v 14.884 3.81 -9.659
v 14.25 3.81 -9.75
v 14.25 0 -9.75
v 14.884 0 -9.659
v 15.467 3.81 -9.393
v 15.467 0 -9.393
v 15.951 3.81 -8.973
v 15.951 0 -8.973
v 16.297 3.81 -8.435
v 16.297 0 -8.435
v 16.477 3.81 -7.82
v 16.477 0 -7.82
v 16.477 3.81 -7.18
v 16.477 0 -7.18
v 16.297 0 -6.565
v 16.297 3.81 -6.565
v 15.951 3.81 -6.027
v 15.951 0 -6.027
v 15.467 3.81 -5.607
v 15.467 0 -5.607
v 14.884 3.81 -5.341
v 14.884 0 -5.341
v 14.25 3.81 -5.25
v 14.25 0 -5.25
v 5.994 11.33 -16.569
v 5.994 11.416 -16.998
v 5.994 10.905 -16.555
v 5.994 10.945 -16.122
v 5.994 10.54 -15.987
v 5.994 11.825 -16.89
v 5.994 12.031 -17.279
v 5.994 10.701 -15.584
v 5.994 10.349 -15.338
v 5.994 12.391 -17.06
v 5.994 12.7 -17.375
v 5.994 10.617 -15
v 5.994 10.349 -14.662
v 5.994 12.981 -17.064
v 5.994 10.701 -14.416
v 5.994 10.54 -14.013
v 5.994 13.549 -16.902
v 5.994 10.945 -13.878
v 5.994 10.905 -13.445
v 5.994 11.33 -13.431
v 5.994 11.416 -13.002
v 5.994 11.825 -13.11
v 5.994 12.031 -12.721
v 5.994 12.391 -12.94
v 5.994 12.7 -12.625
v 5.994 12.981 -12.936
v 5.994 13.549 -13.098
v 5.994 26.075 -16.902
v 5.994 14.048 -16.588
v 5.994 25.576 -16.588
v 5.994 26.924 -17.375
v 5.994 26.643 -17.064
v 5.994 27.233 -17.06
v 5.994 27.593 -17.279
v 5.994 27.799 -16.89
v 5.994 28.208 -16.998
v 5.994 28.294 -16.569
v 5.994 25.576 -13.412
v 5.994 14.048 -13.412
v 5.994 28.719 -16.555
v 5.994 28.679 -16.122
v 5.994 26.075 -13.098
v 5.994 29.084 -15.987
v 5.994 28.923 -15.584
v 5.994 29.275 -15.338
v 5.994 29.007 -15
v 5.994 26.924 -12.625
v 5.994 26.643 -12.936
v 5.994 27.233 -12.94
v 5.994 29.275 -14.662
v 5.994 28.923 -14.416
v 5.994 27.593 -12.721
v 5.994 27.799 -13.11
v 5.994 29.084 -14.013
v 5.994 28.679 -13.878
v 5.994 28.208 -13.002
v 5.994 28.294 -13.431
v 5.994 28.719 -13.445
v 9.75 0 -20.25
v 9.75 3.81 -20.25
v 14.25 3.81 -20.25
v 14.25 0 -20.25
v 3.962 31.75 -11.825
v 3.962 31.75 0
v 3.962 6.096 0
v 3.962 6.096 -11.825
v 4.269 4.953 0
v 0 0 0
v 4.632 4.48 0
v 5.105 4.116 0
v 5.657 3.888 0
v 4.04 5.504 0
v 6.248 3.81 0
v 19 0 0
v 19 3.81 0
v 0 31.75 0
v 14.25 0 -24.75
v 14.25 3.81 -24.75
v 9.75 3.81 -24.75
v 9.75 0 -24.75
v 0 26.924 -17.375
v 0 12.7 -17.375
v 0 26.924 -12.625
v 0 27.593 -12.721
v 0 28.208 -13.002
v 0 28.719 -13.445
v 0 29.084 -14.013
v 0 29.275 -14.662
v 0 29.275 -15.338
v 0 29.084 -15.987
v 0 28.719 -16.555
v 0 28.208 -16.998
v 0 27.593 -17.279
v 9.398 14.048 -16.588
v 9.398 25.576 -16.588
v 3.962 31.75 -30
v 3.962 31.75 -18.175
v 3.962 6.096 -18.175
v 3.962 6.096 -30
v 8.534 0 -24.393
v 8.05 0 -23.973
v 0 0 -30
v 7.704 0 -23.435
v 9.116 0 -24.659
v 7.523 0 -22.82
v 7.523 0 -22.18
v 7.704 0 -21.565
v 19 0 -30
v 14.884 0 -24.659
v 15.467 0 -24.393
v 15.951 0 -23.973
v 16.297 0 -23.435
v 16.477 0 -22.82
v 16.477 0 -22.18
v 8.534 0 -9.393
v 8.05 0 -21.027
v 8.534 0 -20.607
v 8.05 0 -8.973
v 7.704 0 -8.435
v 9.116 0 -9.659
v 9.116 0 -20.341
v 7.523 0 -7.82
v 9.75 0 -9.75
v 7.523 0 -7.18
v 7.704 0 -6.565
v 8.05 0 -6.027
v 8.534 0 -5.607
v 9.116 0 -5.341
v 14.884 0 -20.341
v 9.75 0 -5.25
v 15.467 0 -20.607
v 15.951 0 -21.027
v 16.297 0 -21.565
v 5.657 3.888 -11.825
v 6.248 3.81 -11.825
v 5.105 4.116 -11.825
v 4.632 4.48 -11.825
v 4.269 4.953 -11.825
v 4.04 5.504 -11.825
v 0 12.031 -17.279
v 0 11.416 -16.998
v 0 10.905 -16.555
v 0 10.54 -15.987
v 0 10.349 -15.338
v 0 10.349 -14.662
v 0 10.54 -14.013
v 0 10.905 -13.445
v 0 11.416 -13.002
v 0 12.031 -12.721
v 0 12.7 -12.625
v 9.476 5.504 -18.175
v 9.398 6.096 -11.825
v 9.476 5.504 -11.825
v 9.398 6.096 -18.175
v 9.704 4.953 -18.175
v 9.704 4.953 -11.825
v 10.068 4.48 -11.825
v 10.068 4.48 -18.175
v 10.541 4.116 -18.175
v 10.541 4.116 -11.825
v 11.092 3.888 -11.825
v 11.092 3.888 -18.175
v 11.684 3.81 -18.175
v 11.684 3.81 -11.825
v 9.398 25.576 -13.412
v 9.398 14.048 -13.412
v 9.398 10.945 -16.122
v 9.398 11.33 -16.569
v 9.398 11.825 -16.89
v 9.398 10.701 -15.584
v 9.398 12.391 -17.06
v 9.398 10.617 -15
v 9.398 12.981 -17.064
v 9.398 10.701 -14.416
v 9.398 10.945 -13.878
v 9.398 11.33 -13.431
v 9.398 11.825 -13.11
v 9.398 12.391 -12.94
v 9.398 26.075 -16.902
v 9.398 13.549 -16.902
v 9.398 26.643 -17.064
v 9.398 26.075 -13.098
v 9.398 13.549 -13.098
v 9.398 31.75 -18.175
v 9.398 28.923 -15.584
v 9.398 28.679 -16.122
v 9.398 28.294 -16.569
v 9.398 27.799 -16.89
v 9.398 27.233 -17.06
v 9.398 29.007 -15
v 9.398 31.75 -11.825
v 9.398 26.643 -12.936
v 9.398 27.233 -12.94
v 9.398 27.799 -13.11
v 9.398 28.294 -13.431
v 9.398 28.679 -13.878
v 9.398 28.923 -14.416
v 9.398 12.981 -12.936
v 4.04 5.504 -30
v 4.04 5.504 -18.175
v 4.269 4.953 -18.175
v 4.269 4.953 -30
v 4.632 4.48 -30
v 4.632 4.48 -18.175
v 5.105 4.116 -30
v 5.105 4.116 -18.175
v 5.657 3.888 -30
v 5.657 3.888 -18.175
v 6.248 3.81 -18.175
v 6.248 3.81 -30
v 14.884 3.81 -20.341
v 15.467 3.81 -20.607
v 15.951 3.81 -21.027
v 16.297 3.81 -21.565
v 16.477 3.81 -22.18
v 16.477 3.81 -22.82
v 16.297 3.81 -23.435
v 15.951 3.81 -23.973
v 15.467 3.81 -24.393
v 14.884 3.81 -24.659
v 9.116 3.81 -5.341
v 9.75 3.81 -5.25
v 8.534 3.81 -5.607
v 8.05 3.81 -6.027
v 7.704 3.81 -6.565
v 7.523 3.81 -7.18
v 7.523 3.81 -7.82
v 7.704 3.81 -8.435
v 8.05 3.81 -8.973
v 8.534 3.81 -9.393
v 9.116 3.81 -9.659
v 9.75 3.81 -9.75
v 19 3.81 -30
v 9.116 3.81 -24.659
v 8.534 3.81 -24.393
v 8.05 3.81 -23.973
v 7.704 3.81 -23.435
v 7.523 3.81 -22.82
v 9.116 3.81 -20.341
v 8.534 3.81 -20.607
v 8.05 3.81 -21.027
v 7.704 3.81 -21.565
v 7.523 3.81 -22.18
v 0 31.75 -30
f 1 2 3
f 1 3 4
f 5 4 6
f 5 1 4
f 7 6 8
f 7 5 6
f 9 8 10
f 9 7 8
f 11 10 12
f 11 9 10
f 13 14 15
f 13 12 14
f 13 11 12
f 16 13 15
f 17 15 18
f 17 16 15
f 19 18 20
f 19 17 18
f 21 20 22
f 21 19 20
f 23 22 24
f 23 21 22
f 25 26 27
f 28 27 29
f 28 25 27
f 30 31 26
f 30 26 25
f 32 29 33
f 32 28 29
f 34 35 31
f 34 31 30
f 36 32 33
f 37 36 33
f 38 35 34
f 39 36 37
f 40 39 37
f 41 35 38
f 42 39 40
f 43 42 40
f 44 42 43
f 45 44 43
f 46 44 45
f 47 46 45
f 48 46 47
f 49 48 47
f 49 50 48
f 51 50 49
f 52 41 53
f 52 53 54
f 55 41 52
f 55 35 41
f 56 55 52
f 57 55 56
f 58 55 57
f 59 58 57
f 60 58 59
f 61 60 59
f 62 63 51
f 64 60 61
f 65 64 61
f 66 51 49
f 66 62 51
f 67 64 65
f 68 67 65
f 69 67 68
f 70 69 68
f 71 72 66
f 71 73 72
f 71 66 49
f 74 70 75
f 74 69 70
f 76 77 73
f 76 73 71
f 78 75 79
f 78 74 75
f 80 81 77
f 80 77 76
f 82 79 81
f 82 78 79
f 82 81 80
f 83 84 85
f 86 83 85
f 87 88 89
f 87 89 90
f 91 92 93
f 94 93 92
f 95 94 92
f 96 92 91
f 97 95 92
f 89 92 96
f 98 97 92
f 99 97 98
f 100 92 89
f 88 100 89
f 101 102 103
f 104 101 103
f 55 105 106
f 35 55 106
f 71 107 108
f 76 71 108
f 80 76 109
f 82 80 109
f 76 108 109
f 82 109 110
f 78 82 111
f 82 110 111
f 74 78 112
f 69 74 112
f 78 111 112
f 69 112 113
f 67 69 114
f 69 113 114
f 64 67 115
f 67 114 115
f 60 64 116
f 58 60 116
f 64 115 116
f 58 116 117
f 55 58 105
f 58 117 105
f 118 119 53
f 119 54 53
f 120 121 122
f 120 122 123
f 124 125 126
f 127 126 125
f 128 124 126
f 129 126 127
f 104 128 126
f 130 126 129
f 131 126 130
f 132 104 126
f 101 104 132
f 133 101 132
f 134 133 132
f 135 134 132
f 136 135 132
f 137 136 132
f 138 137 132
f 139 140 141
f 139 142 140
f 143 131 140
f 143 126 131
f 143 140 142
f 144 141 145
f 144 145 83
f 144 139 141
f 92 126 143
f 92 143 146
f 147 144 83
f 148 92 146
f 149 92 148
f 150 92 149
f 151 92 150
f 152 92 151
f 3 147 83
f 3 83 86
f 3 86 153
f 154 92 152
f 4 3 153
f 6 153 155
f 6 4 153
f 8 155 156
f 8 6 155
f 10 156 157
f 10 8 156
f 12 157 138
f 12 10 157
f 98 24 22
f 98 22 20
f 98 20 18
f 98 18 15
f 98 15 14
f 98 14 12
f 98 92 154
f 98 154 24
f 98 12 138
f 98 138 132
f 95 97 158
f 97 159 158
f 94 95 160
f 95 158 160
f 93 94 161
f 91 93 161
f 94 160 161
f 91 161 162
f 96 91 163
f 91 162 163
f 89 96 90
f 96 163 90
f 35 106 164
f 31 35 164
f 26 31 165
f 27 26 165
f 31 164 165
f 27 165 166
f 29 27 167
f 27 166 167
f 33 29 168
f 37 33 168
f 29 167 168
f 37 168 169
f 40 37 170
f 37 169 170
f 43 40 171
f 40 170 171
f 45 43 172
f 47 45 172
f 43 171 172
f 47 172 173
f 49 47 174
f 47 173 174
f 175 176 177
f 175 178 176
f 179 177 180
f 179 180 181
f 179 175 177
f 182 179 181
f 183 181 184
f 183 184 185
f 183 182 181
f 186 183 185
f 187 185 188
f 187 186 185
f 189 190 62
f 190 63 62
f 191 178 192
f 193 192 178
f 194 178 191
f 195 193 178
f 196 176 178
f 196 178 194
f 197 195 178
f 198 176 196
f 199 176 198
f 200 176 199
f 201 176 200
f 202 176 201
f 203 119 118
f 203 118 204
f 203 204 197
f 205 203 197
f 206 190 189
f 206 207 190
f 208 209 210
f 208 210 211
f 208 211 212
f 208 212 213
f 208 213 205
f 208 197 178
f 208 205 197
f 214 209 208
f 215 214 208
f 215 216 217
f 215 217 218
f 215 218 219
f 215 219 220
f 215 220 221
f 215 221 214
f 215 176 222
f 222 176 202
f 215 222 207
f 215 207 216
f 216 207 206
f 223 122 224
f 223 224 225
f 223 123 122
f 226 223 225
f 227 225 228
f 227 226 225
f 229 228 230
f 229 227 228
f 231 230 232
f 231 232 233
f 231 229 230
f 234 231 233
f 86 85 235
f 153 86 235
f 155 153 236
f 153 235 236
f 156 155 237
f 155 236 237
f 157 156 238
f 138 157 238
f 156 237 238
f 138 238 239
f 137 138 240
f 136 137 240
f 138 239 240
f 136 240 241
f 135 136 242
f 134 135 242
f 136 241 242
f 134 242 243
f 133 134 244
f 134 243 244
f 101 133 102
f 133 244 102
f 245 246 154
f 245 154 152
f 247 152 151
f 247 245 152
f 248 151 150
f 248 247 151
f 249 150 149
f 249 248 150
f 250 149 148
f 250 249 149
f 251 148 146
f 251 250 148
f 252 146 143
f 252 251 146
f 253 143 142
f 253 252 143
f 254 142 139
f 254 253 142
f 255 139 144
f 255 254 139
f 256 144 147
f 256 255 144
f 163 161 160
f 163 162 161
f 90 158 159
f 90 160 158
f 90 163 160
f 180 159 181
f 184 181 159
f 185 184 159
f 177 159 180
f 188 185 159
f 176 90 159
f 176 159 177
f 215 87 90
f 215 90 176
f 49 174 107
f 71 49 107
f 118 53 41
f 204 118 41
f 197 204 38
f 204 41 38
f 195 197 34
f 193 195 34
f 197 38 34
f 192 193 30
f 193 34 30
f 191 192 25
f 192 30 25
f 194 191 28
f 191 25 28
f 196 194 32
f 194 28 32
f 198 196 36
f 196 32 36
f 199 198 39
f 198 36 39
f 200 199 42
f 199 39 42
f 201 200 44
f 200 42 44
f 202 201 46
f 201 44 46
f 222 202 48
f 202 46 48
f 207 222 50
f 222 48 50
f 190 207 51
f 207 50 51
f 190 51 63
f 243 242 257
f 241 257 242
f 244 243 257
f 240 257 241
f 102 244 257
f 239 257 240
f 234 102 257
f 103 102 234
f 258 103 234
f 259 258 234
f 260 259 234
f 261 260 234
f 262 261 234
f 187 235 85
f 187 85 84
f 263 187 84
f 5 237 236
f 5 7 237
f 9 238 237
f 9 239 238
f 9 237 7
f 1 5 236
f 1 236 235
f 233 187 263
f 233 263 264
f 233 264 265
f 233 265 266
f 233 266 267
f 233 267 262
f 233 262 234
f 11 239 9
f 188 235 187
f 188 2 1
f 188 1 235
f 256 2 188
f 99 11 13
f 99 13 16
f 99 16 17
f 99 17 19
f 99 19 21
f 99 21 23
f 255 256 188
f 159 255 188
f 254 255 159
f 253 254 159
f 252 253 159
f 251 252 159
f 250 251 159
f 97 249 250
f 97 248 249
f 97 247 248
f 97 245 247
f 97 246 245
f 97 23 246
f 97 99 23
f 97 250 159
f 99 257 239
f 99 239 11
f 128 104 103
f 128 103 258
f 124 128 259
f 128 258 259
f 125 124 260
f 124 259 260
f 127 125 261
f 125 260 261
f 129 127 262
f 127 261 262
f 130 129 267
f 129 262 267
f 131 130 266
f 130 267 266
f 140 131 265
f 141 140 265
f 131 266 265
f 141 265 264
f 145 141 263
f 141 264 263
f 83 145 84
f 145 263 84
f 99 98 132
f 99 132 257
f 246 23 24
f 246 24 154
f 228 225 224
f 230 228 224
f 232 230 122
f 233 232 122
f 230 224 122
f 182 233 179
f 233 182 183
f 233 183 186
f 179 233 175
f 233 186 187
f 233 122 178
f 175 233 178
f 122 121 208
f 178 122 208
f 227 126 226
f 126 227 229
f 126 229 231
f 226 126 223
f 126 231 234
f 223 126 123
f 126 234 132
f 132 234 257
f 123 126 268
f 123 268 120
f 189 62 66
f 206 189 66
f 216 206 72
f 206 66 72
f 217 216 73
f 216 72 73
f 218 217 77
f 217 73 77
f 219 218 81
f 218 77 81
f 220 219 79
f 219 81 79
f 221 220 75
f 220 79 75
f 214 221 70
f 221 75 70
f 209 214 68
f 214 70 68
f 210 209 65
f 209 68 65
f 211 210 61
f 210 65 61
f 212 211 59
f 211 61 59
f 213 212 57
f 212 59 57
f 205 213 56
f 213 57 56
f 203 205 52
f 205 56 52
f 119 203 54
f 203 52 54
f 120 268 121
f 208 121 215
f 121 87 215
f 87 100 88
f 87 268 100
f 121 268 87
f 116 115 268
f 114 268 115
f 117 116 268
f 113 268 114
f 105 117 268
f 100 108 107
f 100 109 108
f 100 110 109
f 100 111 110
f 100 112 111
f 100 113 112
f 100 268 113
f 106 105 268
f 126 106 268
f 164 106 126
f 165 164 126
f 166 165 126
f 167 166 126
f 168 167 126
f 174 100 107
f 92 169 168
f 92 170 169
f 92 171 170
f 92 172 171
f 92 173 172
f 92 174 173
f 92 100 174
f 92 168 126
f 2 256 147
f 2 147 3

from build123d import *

# Parameters (mm, degrees)
EXTRUDE_THIN1_DEPTH     = 30
EXTRUDE5_DEPTH          = 4.81
SKETCH10_W              = 5.588
SKETCH10_H              = 27.94
BOSS_EXTRUDE1_DEPTH     = 30
CUT_EXTRUDE1_DEPTH      = 16.19
CUT_EXTRUDE1_DEPTH_BACK = 4.81
F_8_32_TAPPED_HOLE1_D   = 4.1656
SKETCH14_W              = 5.4356
SKETCH14_H              = 11.825
CUT_EXTRUDE2_DEPTH      = 27.94
FILLET1_R               = 2.286
FILLET2_R               = 2.286
CUT_EXTRUDE3_DEPTH      = 5.9944


with BuildPart() as part:
    # Sketch1 → Extrude-Thin1 (new body)
    with BuildSketch(Plane.XY):
        Polygon((0, 31.75), (0, 0), (19, 0), (19, 3.81), (3.81, 3.81), (3.81, 31.75), align=None)
    extrude(amount=-EXTRUDE_THIN1_DEPTH)

    # Sketch6 → Extrude5 (cut, through all)
    with BuildSketch(Plane(origin=(0, 3.81, 0), x_dir=(1, 0, 0), z_dir=(0, 1, 0))):
        with BuildLine():
            Line((14.2502, 24.75), (9.7502, 24.75))
            ThreePointArc((9.7502, 24.75), (7.5002, 22.5), (9.7502, 20.25))
            Line((9.7502, 20.25), (14.2502, 20.25))
            ThreePointArc((14.2502, 20.25), (16.5002, 22.5), (14.2502, 24.75))
        make_face()
        with BuildLine():
            Line((9.7502, 9.75), (14.2502, 9.75))
            ThreePointArc((14.2502, 9.75), (16.5002, 7.5), (14.2502, 5.25))
            Line((14.2502, 5.25), (9.7502, 5.25))
            ThreePointArc((9.7502, 5.25), (7.5002, 7.5), (9.7502, 9.75))
        make_face()
    extrude(amount=-EXTRUDE5_DEPTH, mode=Mode.SUBTRACT)

    # Sketch10 → Boss-Extrude1 (add)
    with BuildSketch(Plane.XY):
        with Locations((6.604, 17.78)):
            Rectangle(SKETCH10_W, SKETCH10_H)
    extrude(amount=-BOSS_EXTRUDE1_DEPTH)

    # Sketch4 → Cut-Extrude1 (cut, two sides)
    with BuildSketch(Plane(origin=(3.81, 0, 0), x_dir=(0, 0, -1), z_dir=(1, 0, 0))) as cut_extrude1_sk:
        with BuildLine():
            Line((13.4125, 12.7), (13.4125, 26.924))
            ThreePointArc((13.4125, 26.924), (15, 28.5115), (16.5875, 26.924))
            Line((16.5875, 26.924), (16.5875, 12.7))
            ThreePointArc((16.5875, 12.7), (15, 11.1125), (13.4125, 12.7))
        make_face()
    extrude(amount=CUT_EXTRUDE1_DEPTH, mode=Mode.SUBTRACT)
    extrude(cut_extrude1_sk.sketch, amount=-CUT_EXTRUDE1_DEPTH_BACK, mode=Mode.SUBTRACT)

    # #8-32 Tapped Hole1 (through all)
    with Locations(Plane(origin=(9.398, 0, 0), x_dir=(0, 0, -1), z_dir=(1, 0, 0))):
        with Locations((15, 12.7), (15, 26.924)):
            Hole(F_8_32_TAPPED_HOLE1_D / 2)

    # Sketch14 → Cut-Extrude2 (cut)
    with BuildSketch(Plane(origin=(0, 31.75, 0), x_dir=(1, 0, 0), z_dir=(0, 1, 0))):
        with Locations((6.6802, 24.0875)):
            Rectangle(SKETCH14_W, SKETCH14_H)
        with Locations((6.6802, 5.9125)):
            Rectangle(SKETCH14_W, SKETCH14_H)
    extrude(amount=-CUT_EXTRUDE2_DEPTH, mode=Mode.SUBTRACT)

    # Fillet1
    fillet1_edges = [part.edges().sort_by_distance(p)[0] for p in [
        (9.398, 3.81, -15),
    ]]
    fillet(fillet1_edges, radius=FILLET1_R)

    # Fillet2
    fillet2_edges = [part.edges().sort_by_distance(p)[0] for p in [
        (3.9624, 3.81, -24.0875),
        (3.9624, 3.81, -5.9125),
    ]]
    fillet(fillet2_edges, radius=FILLET2_R)

    # Sketch11 → Cut-Extrude3 (cut)
    with BuildSketch(Plane(origin=(0, 0, 5.175), x_dir=(0, 0, -1), z_dir=(1, 0, 0))):
        with BuildLine():
            Line((17.8001, 12.7), (17.8001, 26.924))
            ThreePointArc((17.8001, 26.924), (20.175, 29.2989), (22.5499, 26.924))
            Line((22.5499, 26.924), (22.5499, 12.7))
            ThreePointArc((22.5499, 12.7), (20.175, 10.3251), (17.8001, 12.7))
        make_face()
    extrude(amount=CUT_EXTRUDE3_DEPTH, mode=Mode.SUBTRACT)


solid = part.part
